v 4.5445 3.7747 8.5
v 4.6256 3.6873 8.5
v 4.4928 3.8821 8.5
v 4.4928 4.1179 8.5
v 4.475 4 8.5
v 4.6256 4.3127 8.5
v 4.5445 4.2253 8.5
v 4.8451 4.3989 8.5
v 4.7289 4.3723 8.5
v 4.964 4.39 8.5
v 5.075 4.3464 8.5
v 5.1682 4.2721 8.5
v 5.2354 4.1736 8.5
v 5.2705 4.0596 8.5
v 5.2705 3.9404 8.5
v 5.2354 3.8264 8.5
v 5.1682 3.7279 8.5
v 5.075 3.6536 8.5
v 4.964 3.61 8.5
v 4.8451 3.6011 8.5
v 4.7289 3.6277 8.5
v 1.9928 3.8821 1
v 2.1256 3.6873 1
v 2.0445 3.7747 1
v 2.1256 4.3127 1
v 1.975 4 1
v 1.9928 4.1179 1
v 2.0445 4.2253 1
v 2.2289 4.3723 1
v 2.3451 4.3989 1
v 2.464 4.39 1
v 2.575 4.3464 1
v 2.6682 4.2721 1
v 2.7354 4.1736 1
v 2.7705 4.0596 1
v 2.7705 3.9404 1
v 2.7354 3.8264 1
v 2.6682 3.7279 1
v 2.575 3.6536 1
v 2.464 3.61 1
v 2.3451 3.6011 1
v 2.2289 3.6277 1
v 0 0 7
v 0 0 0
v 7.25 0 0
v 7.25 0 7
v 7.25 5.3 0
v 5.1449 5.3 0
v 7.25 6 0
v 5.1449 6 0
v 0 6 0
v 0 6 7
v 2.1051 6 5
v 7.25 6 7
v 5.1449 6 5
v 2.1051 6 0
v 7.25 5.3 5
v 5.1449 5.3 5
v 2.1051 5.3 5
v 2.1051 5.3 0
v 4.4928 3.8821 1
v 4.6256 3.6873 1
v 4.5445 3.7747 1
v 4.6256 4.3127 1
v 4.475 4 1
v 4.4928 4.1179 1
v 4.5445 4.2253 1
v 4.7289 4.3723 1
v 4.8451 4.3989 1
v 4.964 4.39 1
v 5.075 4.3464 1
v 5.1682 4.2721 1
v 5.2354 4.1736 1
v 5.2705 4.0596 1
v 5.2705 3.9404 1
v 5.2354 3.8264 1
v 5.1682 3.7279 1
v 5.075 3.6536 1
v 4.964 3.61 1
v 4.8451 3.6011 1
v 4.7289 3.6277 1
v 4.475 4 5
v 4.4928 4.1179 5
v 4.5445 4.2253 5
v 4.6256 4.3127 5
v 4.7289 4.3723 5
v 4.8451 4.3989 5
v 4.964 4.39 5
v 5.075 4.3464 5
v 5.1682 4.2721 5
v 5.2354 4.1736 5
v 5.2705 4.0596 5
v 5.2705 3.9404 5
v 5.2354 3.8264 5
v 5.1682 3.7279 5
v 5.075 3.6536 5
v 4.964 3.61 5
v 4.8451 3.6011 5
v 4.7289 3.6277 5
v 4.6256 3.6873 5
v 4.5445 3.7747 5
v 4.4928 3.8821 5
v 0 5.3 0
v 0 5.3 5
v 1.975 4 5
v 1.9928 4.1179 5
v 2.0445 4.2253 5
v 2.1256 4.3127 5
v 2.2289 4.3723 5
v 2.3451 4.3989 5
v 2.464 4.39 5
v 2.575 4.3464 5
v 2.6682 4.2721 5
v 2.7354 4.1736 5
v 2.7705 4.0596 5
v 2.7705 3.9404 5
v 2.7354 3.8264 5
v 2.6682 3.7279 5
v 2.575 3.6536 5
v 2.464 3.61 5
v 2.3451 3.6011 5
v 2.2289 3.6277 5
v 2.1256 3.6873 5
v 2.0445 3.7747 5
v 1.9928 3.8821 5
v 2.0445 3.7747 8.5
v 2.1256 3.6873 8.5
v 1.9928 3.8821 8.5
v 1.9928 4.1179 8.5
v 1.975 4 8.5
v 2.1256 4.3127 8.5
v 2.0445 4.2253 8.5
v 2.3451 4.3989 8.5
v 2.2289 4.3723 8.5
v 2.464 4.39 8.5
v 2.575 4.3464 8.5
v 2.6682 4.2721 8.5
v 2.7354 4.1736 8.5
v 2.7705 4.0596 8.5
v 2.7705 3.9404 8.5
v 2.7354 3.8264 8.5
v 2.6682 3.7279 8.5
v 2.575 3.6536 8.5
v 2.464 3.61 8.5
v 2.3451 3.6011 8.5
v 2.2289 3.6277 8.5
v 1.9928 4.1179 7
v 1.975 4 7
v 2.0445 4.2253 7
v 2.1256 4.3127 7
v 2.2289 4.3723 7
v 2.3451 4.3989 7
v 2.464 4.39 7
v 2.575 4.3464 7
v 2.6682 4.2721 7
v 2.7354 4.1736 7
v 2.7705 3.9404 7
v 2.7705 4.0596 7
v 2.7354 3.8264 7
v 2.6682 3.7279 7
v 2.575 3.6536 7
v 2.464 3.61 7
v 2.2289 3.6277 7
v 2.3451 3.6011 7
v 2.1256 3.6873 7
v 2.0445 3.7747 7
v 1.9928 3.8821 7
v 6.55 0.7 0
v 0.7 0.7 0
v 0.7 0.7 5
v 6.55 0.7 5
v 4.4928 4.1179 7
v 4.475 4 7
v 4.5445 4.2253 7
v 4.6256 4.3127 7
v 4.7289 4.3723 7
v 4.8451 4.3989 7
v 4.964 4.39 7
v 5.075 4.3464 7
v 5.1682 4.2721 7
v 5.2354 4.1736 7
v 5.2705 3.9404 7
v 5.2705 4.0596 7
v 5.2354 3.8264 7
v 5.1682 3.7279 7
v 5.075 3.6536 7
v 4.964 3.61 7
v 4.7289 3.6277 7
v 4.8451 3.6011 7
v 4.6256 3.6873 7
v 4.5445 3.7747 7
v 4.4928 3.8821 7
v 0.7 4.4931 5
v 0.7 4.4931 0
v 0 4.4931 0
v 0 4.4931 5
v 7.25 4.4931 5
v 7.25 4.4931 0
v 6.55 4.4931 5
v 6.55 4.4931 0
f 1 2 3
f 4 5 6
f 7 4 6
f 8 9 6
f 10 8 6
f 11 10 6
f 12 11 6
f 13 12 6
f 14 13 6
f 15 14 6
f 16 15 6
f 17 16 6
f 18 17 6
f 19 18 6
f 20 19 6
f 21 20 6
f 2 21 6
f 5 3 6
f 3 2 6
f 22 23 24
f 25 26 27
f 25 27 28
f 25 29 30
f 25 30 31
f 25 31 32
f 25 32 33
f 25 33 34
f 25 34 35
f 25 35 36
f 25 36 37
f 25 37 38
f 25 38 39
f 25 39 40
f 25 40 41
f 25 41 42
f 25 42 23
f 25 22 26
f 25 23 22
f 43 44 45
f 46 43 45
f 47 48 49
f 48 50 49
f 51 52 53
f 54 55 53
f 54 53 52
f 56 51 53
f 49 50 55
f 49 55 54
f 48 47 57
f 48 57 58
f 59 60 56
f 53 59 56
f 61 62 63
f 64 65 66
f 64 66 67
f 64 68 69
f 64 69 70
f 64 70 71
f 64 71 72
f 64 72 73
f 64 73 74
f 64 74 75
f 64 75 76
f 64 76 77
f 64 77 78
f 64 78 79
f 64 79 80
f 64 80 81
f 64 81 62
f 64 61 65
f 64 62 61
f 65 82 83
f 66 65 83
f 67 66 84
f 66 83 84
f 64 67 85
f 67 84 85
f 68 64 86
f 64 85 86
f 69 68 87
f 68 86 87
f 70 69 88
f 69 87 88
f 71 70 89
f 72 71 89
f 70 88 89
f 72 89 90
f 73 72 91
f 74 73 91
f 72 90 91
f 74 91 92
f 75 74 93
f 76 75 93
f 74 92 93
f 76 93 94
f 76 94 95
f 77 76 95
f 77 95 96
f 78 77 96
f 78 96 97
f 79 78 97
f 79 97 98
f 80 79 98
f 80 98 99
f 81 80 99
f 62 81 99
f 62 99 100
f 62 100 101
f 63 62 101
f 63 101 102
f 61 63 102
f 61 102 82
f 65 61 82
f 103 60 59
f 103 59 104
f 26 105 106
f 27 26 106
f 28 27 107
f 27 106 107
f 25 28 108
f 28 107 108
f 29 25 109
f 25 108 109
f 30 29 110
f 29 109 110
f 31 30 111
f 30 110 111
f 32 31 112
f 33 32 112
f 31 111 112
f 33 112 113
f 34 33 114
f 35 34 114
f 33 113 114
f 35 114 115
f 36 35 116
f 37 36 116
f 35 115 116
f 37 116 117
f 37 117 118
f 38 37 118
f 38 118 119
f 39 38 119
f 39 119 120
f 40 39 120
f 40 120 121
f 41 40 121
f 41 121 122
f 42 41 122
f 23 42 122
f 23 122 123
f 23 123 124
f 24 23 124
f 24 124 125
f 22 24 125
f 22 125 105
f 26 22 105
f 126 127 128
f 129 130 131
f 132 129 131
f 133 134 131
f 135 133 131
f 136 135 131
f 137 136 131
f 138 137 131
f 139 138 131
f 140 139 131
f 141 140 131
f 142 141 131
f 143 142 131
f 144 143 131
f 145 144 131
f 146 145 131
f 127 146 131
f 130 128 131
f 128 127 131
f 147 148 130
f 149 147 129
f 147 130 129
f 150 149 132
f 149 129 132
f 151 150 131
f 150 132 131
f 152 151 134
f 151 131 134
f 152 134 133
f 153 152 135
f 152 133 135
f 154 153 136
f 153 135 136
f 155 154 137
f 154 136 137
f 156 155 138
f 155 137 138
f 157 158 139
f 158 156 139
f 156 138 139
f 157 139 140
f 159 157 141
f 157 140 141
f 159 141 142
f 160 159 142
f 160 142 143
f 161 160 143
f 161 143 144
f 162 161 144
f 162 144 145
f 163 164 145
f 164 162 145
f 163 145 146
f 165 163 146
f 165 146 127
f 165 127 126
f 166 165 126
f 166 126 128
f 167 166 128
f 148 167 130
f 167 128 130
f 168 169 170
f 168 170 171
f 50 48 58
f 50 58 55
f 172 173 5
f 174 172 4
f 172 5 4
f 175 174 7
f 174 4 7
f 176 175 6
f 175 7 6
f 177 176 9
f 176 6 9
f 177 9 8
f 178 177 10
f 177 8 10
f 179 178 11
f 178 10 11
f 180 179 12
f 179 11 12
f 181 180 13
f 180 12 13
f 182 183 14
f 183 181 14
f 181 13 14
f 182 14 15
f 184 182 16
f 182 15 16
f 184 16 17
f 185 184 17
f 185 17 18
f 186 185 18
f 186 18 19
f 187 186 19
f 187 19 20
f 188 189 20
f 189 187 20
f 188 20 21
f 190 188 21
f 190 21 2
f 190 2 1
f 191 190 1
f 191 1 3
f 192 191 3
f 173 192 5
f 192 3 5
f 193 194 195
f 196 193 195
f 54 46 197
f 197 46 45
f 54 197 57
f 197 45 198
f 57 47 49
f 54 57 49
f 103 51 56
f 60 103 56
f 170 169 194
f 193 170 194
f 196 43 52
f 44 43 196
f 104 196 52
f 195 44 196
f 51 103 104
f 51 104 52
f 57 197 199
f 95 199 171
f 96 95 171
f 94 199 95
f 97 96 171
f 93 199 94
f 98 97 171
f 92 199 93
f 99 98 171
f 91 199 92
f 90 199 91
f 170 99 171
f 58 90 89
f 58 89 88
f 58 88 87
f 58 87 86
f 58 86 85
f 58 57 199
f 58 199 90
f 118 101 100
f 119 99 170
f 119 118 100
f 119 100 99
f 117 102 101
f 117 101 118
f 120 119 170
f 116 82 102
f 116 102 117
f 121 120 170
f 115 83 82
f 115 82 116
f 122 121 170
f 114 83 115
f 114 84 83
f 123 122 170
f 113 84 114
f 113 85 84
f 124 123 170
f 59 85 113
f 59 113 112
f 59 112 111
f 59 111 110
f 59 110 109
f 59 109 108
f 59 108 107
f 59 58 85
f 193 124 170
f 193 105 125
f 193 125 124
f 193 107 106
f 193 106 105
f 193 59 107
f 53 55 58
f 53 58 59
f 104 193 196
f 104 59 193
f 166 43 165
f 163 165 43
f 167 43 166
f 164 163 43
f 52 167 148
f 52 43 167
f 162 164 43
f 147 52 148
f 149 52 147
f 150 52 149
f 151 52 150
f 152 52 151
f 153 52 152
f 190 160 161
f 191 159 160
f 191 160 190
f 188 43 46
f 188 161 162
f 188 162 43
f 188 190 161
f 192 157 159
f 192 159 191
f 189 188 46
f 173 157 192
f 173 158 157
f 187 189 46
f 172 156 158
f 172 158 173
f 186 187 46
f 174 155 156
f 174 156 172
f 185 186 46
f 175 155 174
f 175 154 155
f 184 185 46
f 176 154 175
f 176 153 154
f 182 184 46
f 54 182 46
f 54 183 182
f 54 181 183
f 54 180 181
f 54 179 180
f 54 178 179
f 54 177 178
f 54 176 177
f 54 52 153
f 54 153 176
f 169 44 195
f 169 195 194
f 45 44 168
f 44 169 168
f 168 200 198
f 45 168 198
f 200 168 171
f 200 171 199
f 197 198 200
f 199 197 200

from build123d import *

# Parameters (mm, degrees)
SKETCH_1_W           = 7.25
SKETCH_1_H           = 6
EXTRUDE_1_DEPTH      = 7
SKETCH_2_W           = 5.85
SKETCH_2_H           = 4.6
CUT_EXTRUDE_1_DEPTH  = 5
SKETCH_3_W           = 0.7
SKETCH_3_H           = 0.8068671
SKETCH_3_W_2         = 3.039789906
SKETCH_3_H_2         = 0.7
CUT_EXTRUDE_2_DEPTH  = 5
EXTRUDE_2_DEPTH      = 4
EXTRUDE_2_DEPTH_BACK = 3.5
SKETCH_4_R           = 0.4


with BuildPart() as part:
    # 草图1 → 凸台-拉伸1 (new body)
    with BuildSketch(Plane.XY):
        with Locations((3.625, 3)):
            Rectangle(SKETCH_1_W, SKETCH_1_H)
    extrude(amount=EXTRUDE_1_DEPTH)

    # 草图2 → 切除-拉伸1 (cut)
    with BuildSketch(Plane.XY):
        with Locations((3.625, 3)):
            Rectangle(SKETCH_2_W, SKETCH_2_H)
    extrude(amount=CUT_EXTRUDE_1_DEPTH, mode=Mode.SUBTRACT)

    # 草图3 → 切除-拉伸2 (cut)
    with BuildSketch(Plane(origin=(0, 0, 0), x_dir=(-1, 0, 0), z_dir=(0, 0, -1))):
        with Locations((-6.9, 4.89656645)):
            Rectangle(SKETCH_3_W, SKETCH_3_H)
        with Locations((-0.35, 4.89656645)):
            Rectangle(SKETCH_3_W, SKETCH_3_H)
        with Locations((-3.625, 5.65)):
            Rectangle(SKETCH_3_W_2, SKETCH_3_H_2)
    extrude(amount=-CUT_EXTRUDE_2_DEPTH, mode=Mode.SUBTRACT)

    # 草图4 → 凸台-拉伸2 (add, two sides: drawn at the far end of the back side and taken through both)
    with BuildSketch(Plane(origin=(0, 0, 5), x_dir=(-1, 0, 0), z_dir=(0, 0, -1)).offset(-EXTRUDE_2_DEPTH_BACK)):
        with Locations((-4.875, 4)):
            Circle(SKETCH_4_R)
        with Locations((-2.375, 4)):
            Circle(SKETCH_4_R)
    extrude(amount=EXTRUDE_2_DEPTH + EXTRUDE_2_DEPTH_BACK)


solid = part.part
